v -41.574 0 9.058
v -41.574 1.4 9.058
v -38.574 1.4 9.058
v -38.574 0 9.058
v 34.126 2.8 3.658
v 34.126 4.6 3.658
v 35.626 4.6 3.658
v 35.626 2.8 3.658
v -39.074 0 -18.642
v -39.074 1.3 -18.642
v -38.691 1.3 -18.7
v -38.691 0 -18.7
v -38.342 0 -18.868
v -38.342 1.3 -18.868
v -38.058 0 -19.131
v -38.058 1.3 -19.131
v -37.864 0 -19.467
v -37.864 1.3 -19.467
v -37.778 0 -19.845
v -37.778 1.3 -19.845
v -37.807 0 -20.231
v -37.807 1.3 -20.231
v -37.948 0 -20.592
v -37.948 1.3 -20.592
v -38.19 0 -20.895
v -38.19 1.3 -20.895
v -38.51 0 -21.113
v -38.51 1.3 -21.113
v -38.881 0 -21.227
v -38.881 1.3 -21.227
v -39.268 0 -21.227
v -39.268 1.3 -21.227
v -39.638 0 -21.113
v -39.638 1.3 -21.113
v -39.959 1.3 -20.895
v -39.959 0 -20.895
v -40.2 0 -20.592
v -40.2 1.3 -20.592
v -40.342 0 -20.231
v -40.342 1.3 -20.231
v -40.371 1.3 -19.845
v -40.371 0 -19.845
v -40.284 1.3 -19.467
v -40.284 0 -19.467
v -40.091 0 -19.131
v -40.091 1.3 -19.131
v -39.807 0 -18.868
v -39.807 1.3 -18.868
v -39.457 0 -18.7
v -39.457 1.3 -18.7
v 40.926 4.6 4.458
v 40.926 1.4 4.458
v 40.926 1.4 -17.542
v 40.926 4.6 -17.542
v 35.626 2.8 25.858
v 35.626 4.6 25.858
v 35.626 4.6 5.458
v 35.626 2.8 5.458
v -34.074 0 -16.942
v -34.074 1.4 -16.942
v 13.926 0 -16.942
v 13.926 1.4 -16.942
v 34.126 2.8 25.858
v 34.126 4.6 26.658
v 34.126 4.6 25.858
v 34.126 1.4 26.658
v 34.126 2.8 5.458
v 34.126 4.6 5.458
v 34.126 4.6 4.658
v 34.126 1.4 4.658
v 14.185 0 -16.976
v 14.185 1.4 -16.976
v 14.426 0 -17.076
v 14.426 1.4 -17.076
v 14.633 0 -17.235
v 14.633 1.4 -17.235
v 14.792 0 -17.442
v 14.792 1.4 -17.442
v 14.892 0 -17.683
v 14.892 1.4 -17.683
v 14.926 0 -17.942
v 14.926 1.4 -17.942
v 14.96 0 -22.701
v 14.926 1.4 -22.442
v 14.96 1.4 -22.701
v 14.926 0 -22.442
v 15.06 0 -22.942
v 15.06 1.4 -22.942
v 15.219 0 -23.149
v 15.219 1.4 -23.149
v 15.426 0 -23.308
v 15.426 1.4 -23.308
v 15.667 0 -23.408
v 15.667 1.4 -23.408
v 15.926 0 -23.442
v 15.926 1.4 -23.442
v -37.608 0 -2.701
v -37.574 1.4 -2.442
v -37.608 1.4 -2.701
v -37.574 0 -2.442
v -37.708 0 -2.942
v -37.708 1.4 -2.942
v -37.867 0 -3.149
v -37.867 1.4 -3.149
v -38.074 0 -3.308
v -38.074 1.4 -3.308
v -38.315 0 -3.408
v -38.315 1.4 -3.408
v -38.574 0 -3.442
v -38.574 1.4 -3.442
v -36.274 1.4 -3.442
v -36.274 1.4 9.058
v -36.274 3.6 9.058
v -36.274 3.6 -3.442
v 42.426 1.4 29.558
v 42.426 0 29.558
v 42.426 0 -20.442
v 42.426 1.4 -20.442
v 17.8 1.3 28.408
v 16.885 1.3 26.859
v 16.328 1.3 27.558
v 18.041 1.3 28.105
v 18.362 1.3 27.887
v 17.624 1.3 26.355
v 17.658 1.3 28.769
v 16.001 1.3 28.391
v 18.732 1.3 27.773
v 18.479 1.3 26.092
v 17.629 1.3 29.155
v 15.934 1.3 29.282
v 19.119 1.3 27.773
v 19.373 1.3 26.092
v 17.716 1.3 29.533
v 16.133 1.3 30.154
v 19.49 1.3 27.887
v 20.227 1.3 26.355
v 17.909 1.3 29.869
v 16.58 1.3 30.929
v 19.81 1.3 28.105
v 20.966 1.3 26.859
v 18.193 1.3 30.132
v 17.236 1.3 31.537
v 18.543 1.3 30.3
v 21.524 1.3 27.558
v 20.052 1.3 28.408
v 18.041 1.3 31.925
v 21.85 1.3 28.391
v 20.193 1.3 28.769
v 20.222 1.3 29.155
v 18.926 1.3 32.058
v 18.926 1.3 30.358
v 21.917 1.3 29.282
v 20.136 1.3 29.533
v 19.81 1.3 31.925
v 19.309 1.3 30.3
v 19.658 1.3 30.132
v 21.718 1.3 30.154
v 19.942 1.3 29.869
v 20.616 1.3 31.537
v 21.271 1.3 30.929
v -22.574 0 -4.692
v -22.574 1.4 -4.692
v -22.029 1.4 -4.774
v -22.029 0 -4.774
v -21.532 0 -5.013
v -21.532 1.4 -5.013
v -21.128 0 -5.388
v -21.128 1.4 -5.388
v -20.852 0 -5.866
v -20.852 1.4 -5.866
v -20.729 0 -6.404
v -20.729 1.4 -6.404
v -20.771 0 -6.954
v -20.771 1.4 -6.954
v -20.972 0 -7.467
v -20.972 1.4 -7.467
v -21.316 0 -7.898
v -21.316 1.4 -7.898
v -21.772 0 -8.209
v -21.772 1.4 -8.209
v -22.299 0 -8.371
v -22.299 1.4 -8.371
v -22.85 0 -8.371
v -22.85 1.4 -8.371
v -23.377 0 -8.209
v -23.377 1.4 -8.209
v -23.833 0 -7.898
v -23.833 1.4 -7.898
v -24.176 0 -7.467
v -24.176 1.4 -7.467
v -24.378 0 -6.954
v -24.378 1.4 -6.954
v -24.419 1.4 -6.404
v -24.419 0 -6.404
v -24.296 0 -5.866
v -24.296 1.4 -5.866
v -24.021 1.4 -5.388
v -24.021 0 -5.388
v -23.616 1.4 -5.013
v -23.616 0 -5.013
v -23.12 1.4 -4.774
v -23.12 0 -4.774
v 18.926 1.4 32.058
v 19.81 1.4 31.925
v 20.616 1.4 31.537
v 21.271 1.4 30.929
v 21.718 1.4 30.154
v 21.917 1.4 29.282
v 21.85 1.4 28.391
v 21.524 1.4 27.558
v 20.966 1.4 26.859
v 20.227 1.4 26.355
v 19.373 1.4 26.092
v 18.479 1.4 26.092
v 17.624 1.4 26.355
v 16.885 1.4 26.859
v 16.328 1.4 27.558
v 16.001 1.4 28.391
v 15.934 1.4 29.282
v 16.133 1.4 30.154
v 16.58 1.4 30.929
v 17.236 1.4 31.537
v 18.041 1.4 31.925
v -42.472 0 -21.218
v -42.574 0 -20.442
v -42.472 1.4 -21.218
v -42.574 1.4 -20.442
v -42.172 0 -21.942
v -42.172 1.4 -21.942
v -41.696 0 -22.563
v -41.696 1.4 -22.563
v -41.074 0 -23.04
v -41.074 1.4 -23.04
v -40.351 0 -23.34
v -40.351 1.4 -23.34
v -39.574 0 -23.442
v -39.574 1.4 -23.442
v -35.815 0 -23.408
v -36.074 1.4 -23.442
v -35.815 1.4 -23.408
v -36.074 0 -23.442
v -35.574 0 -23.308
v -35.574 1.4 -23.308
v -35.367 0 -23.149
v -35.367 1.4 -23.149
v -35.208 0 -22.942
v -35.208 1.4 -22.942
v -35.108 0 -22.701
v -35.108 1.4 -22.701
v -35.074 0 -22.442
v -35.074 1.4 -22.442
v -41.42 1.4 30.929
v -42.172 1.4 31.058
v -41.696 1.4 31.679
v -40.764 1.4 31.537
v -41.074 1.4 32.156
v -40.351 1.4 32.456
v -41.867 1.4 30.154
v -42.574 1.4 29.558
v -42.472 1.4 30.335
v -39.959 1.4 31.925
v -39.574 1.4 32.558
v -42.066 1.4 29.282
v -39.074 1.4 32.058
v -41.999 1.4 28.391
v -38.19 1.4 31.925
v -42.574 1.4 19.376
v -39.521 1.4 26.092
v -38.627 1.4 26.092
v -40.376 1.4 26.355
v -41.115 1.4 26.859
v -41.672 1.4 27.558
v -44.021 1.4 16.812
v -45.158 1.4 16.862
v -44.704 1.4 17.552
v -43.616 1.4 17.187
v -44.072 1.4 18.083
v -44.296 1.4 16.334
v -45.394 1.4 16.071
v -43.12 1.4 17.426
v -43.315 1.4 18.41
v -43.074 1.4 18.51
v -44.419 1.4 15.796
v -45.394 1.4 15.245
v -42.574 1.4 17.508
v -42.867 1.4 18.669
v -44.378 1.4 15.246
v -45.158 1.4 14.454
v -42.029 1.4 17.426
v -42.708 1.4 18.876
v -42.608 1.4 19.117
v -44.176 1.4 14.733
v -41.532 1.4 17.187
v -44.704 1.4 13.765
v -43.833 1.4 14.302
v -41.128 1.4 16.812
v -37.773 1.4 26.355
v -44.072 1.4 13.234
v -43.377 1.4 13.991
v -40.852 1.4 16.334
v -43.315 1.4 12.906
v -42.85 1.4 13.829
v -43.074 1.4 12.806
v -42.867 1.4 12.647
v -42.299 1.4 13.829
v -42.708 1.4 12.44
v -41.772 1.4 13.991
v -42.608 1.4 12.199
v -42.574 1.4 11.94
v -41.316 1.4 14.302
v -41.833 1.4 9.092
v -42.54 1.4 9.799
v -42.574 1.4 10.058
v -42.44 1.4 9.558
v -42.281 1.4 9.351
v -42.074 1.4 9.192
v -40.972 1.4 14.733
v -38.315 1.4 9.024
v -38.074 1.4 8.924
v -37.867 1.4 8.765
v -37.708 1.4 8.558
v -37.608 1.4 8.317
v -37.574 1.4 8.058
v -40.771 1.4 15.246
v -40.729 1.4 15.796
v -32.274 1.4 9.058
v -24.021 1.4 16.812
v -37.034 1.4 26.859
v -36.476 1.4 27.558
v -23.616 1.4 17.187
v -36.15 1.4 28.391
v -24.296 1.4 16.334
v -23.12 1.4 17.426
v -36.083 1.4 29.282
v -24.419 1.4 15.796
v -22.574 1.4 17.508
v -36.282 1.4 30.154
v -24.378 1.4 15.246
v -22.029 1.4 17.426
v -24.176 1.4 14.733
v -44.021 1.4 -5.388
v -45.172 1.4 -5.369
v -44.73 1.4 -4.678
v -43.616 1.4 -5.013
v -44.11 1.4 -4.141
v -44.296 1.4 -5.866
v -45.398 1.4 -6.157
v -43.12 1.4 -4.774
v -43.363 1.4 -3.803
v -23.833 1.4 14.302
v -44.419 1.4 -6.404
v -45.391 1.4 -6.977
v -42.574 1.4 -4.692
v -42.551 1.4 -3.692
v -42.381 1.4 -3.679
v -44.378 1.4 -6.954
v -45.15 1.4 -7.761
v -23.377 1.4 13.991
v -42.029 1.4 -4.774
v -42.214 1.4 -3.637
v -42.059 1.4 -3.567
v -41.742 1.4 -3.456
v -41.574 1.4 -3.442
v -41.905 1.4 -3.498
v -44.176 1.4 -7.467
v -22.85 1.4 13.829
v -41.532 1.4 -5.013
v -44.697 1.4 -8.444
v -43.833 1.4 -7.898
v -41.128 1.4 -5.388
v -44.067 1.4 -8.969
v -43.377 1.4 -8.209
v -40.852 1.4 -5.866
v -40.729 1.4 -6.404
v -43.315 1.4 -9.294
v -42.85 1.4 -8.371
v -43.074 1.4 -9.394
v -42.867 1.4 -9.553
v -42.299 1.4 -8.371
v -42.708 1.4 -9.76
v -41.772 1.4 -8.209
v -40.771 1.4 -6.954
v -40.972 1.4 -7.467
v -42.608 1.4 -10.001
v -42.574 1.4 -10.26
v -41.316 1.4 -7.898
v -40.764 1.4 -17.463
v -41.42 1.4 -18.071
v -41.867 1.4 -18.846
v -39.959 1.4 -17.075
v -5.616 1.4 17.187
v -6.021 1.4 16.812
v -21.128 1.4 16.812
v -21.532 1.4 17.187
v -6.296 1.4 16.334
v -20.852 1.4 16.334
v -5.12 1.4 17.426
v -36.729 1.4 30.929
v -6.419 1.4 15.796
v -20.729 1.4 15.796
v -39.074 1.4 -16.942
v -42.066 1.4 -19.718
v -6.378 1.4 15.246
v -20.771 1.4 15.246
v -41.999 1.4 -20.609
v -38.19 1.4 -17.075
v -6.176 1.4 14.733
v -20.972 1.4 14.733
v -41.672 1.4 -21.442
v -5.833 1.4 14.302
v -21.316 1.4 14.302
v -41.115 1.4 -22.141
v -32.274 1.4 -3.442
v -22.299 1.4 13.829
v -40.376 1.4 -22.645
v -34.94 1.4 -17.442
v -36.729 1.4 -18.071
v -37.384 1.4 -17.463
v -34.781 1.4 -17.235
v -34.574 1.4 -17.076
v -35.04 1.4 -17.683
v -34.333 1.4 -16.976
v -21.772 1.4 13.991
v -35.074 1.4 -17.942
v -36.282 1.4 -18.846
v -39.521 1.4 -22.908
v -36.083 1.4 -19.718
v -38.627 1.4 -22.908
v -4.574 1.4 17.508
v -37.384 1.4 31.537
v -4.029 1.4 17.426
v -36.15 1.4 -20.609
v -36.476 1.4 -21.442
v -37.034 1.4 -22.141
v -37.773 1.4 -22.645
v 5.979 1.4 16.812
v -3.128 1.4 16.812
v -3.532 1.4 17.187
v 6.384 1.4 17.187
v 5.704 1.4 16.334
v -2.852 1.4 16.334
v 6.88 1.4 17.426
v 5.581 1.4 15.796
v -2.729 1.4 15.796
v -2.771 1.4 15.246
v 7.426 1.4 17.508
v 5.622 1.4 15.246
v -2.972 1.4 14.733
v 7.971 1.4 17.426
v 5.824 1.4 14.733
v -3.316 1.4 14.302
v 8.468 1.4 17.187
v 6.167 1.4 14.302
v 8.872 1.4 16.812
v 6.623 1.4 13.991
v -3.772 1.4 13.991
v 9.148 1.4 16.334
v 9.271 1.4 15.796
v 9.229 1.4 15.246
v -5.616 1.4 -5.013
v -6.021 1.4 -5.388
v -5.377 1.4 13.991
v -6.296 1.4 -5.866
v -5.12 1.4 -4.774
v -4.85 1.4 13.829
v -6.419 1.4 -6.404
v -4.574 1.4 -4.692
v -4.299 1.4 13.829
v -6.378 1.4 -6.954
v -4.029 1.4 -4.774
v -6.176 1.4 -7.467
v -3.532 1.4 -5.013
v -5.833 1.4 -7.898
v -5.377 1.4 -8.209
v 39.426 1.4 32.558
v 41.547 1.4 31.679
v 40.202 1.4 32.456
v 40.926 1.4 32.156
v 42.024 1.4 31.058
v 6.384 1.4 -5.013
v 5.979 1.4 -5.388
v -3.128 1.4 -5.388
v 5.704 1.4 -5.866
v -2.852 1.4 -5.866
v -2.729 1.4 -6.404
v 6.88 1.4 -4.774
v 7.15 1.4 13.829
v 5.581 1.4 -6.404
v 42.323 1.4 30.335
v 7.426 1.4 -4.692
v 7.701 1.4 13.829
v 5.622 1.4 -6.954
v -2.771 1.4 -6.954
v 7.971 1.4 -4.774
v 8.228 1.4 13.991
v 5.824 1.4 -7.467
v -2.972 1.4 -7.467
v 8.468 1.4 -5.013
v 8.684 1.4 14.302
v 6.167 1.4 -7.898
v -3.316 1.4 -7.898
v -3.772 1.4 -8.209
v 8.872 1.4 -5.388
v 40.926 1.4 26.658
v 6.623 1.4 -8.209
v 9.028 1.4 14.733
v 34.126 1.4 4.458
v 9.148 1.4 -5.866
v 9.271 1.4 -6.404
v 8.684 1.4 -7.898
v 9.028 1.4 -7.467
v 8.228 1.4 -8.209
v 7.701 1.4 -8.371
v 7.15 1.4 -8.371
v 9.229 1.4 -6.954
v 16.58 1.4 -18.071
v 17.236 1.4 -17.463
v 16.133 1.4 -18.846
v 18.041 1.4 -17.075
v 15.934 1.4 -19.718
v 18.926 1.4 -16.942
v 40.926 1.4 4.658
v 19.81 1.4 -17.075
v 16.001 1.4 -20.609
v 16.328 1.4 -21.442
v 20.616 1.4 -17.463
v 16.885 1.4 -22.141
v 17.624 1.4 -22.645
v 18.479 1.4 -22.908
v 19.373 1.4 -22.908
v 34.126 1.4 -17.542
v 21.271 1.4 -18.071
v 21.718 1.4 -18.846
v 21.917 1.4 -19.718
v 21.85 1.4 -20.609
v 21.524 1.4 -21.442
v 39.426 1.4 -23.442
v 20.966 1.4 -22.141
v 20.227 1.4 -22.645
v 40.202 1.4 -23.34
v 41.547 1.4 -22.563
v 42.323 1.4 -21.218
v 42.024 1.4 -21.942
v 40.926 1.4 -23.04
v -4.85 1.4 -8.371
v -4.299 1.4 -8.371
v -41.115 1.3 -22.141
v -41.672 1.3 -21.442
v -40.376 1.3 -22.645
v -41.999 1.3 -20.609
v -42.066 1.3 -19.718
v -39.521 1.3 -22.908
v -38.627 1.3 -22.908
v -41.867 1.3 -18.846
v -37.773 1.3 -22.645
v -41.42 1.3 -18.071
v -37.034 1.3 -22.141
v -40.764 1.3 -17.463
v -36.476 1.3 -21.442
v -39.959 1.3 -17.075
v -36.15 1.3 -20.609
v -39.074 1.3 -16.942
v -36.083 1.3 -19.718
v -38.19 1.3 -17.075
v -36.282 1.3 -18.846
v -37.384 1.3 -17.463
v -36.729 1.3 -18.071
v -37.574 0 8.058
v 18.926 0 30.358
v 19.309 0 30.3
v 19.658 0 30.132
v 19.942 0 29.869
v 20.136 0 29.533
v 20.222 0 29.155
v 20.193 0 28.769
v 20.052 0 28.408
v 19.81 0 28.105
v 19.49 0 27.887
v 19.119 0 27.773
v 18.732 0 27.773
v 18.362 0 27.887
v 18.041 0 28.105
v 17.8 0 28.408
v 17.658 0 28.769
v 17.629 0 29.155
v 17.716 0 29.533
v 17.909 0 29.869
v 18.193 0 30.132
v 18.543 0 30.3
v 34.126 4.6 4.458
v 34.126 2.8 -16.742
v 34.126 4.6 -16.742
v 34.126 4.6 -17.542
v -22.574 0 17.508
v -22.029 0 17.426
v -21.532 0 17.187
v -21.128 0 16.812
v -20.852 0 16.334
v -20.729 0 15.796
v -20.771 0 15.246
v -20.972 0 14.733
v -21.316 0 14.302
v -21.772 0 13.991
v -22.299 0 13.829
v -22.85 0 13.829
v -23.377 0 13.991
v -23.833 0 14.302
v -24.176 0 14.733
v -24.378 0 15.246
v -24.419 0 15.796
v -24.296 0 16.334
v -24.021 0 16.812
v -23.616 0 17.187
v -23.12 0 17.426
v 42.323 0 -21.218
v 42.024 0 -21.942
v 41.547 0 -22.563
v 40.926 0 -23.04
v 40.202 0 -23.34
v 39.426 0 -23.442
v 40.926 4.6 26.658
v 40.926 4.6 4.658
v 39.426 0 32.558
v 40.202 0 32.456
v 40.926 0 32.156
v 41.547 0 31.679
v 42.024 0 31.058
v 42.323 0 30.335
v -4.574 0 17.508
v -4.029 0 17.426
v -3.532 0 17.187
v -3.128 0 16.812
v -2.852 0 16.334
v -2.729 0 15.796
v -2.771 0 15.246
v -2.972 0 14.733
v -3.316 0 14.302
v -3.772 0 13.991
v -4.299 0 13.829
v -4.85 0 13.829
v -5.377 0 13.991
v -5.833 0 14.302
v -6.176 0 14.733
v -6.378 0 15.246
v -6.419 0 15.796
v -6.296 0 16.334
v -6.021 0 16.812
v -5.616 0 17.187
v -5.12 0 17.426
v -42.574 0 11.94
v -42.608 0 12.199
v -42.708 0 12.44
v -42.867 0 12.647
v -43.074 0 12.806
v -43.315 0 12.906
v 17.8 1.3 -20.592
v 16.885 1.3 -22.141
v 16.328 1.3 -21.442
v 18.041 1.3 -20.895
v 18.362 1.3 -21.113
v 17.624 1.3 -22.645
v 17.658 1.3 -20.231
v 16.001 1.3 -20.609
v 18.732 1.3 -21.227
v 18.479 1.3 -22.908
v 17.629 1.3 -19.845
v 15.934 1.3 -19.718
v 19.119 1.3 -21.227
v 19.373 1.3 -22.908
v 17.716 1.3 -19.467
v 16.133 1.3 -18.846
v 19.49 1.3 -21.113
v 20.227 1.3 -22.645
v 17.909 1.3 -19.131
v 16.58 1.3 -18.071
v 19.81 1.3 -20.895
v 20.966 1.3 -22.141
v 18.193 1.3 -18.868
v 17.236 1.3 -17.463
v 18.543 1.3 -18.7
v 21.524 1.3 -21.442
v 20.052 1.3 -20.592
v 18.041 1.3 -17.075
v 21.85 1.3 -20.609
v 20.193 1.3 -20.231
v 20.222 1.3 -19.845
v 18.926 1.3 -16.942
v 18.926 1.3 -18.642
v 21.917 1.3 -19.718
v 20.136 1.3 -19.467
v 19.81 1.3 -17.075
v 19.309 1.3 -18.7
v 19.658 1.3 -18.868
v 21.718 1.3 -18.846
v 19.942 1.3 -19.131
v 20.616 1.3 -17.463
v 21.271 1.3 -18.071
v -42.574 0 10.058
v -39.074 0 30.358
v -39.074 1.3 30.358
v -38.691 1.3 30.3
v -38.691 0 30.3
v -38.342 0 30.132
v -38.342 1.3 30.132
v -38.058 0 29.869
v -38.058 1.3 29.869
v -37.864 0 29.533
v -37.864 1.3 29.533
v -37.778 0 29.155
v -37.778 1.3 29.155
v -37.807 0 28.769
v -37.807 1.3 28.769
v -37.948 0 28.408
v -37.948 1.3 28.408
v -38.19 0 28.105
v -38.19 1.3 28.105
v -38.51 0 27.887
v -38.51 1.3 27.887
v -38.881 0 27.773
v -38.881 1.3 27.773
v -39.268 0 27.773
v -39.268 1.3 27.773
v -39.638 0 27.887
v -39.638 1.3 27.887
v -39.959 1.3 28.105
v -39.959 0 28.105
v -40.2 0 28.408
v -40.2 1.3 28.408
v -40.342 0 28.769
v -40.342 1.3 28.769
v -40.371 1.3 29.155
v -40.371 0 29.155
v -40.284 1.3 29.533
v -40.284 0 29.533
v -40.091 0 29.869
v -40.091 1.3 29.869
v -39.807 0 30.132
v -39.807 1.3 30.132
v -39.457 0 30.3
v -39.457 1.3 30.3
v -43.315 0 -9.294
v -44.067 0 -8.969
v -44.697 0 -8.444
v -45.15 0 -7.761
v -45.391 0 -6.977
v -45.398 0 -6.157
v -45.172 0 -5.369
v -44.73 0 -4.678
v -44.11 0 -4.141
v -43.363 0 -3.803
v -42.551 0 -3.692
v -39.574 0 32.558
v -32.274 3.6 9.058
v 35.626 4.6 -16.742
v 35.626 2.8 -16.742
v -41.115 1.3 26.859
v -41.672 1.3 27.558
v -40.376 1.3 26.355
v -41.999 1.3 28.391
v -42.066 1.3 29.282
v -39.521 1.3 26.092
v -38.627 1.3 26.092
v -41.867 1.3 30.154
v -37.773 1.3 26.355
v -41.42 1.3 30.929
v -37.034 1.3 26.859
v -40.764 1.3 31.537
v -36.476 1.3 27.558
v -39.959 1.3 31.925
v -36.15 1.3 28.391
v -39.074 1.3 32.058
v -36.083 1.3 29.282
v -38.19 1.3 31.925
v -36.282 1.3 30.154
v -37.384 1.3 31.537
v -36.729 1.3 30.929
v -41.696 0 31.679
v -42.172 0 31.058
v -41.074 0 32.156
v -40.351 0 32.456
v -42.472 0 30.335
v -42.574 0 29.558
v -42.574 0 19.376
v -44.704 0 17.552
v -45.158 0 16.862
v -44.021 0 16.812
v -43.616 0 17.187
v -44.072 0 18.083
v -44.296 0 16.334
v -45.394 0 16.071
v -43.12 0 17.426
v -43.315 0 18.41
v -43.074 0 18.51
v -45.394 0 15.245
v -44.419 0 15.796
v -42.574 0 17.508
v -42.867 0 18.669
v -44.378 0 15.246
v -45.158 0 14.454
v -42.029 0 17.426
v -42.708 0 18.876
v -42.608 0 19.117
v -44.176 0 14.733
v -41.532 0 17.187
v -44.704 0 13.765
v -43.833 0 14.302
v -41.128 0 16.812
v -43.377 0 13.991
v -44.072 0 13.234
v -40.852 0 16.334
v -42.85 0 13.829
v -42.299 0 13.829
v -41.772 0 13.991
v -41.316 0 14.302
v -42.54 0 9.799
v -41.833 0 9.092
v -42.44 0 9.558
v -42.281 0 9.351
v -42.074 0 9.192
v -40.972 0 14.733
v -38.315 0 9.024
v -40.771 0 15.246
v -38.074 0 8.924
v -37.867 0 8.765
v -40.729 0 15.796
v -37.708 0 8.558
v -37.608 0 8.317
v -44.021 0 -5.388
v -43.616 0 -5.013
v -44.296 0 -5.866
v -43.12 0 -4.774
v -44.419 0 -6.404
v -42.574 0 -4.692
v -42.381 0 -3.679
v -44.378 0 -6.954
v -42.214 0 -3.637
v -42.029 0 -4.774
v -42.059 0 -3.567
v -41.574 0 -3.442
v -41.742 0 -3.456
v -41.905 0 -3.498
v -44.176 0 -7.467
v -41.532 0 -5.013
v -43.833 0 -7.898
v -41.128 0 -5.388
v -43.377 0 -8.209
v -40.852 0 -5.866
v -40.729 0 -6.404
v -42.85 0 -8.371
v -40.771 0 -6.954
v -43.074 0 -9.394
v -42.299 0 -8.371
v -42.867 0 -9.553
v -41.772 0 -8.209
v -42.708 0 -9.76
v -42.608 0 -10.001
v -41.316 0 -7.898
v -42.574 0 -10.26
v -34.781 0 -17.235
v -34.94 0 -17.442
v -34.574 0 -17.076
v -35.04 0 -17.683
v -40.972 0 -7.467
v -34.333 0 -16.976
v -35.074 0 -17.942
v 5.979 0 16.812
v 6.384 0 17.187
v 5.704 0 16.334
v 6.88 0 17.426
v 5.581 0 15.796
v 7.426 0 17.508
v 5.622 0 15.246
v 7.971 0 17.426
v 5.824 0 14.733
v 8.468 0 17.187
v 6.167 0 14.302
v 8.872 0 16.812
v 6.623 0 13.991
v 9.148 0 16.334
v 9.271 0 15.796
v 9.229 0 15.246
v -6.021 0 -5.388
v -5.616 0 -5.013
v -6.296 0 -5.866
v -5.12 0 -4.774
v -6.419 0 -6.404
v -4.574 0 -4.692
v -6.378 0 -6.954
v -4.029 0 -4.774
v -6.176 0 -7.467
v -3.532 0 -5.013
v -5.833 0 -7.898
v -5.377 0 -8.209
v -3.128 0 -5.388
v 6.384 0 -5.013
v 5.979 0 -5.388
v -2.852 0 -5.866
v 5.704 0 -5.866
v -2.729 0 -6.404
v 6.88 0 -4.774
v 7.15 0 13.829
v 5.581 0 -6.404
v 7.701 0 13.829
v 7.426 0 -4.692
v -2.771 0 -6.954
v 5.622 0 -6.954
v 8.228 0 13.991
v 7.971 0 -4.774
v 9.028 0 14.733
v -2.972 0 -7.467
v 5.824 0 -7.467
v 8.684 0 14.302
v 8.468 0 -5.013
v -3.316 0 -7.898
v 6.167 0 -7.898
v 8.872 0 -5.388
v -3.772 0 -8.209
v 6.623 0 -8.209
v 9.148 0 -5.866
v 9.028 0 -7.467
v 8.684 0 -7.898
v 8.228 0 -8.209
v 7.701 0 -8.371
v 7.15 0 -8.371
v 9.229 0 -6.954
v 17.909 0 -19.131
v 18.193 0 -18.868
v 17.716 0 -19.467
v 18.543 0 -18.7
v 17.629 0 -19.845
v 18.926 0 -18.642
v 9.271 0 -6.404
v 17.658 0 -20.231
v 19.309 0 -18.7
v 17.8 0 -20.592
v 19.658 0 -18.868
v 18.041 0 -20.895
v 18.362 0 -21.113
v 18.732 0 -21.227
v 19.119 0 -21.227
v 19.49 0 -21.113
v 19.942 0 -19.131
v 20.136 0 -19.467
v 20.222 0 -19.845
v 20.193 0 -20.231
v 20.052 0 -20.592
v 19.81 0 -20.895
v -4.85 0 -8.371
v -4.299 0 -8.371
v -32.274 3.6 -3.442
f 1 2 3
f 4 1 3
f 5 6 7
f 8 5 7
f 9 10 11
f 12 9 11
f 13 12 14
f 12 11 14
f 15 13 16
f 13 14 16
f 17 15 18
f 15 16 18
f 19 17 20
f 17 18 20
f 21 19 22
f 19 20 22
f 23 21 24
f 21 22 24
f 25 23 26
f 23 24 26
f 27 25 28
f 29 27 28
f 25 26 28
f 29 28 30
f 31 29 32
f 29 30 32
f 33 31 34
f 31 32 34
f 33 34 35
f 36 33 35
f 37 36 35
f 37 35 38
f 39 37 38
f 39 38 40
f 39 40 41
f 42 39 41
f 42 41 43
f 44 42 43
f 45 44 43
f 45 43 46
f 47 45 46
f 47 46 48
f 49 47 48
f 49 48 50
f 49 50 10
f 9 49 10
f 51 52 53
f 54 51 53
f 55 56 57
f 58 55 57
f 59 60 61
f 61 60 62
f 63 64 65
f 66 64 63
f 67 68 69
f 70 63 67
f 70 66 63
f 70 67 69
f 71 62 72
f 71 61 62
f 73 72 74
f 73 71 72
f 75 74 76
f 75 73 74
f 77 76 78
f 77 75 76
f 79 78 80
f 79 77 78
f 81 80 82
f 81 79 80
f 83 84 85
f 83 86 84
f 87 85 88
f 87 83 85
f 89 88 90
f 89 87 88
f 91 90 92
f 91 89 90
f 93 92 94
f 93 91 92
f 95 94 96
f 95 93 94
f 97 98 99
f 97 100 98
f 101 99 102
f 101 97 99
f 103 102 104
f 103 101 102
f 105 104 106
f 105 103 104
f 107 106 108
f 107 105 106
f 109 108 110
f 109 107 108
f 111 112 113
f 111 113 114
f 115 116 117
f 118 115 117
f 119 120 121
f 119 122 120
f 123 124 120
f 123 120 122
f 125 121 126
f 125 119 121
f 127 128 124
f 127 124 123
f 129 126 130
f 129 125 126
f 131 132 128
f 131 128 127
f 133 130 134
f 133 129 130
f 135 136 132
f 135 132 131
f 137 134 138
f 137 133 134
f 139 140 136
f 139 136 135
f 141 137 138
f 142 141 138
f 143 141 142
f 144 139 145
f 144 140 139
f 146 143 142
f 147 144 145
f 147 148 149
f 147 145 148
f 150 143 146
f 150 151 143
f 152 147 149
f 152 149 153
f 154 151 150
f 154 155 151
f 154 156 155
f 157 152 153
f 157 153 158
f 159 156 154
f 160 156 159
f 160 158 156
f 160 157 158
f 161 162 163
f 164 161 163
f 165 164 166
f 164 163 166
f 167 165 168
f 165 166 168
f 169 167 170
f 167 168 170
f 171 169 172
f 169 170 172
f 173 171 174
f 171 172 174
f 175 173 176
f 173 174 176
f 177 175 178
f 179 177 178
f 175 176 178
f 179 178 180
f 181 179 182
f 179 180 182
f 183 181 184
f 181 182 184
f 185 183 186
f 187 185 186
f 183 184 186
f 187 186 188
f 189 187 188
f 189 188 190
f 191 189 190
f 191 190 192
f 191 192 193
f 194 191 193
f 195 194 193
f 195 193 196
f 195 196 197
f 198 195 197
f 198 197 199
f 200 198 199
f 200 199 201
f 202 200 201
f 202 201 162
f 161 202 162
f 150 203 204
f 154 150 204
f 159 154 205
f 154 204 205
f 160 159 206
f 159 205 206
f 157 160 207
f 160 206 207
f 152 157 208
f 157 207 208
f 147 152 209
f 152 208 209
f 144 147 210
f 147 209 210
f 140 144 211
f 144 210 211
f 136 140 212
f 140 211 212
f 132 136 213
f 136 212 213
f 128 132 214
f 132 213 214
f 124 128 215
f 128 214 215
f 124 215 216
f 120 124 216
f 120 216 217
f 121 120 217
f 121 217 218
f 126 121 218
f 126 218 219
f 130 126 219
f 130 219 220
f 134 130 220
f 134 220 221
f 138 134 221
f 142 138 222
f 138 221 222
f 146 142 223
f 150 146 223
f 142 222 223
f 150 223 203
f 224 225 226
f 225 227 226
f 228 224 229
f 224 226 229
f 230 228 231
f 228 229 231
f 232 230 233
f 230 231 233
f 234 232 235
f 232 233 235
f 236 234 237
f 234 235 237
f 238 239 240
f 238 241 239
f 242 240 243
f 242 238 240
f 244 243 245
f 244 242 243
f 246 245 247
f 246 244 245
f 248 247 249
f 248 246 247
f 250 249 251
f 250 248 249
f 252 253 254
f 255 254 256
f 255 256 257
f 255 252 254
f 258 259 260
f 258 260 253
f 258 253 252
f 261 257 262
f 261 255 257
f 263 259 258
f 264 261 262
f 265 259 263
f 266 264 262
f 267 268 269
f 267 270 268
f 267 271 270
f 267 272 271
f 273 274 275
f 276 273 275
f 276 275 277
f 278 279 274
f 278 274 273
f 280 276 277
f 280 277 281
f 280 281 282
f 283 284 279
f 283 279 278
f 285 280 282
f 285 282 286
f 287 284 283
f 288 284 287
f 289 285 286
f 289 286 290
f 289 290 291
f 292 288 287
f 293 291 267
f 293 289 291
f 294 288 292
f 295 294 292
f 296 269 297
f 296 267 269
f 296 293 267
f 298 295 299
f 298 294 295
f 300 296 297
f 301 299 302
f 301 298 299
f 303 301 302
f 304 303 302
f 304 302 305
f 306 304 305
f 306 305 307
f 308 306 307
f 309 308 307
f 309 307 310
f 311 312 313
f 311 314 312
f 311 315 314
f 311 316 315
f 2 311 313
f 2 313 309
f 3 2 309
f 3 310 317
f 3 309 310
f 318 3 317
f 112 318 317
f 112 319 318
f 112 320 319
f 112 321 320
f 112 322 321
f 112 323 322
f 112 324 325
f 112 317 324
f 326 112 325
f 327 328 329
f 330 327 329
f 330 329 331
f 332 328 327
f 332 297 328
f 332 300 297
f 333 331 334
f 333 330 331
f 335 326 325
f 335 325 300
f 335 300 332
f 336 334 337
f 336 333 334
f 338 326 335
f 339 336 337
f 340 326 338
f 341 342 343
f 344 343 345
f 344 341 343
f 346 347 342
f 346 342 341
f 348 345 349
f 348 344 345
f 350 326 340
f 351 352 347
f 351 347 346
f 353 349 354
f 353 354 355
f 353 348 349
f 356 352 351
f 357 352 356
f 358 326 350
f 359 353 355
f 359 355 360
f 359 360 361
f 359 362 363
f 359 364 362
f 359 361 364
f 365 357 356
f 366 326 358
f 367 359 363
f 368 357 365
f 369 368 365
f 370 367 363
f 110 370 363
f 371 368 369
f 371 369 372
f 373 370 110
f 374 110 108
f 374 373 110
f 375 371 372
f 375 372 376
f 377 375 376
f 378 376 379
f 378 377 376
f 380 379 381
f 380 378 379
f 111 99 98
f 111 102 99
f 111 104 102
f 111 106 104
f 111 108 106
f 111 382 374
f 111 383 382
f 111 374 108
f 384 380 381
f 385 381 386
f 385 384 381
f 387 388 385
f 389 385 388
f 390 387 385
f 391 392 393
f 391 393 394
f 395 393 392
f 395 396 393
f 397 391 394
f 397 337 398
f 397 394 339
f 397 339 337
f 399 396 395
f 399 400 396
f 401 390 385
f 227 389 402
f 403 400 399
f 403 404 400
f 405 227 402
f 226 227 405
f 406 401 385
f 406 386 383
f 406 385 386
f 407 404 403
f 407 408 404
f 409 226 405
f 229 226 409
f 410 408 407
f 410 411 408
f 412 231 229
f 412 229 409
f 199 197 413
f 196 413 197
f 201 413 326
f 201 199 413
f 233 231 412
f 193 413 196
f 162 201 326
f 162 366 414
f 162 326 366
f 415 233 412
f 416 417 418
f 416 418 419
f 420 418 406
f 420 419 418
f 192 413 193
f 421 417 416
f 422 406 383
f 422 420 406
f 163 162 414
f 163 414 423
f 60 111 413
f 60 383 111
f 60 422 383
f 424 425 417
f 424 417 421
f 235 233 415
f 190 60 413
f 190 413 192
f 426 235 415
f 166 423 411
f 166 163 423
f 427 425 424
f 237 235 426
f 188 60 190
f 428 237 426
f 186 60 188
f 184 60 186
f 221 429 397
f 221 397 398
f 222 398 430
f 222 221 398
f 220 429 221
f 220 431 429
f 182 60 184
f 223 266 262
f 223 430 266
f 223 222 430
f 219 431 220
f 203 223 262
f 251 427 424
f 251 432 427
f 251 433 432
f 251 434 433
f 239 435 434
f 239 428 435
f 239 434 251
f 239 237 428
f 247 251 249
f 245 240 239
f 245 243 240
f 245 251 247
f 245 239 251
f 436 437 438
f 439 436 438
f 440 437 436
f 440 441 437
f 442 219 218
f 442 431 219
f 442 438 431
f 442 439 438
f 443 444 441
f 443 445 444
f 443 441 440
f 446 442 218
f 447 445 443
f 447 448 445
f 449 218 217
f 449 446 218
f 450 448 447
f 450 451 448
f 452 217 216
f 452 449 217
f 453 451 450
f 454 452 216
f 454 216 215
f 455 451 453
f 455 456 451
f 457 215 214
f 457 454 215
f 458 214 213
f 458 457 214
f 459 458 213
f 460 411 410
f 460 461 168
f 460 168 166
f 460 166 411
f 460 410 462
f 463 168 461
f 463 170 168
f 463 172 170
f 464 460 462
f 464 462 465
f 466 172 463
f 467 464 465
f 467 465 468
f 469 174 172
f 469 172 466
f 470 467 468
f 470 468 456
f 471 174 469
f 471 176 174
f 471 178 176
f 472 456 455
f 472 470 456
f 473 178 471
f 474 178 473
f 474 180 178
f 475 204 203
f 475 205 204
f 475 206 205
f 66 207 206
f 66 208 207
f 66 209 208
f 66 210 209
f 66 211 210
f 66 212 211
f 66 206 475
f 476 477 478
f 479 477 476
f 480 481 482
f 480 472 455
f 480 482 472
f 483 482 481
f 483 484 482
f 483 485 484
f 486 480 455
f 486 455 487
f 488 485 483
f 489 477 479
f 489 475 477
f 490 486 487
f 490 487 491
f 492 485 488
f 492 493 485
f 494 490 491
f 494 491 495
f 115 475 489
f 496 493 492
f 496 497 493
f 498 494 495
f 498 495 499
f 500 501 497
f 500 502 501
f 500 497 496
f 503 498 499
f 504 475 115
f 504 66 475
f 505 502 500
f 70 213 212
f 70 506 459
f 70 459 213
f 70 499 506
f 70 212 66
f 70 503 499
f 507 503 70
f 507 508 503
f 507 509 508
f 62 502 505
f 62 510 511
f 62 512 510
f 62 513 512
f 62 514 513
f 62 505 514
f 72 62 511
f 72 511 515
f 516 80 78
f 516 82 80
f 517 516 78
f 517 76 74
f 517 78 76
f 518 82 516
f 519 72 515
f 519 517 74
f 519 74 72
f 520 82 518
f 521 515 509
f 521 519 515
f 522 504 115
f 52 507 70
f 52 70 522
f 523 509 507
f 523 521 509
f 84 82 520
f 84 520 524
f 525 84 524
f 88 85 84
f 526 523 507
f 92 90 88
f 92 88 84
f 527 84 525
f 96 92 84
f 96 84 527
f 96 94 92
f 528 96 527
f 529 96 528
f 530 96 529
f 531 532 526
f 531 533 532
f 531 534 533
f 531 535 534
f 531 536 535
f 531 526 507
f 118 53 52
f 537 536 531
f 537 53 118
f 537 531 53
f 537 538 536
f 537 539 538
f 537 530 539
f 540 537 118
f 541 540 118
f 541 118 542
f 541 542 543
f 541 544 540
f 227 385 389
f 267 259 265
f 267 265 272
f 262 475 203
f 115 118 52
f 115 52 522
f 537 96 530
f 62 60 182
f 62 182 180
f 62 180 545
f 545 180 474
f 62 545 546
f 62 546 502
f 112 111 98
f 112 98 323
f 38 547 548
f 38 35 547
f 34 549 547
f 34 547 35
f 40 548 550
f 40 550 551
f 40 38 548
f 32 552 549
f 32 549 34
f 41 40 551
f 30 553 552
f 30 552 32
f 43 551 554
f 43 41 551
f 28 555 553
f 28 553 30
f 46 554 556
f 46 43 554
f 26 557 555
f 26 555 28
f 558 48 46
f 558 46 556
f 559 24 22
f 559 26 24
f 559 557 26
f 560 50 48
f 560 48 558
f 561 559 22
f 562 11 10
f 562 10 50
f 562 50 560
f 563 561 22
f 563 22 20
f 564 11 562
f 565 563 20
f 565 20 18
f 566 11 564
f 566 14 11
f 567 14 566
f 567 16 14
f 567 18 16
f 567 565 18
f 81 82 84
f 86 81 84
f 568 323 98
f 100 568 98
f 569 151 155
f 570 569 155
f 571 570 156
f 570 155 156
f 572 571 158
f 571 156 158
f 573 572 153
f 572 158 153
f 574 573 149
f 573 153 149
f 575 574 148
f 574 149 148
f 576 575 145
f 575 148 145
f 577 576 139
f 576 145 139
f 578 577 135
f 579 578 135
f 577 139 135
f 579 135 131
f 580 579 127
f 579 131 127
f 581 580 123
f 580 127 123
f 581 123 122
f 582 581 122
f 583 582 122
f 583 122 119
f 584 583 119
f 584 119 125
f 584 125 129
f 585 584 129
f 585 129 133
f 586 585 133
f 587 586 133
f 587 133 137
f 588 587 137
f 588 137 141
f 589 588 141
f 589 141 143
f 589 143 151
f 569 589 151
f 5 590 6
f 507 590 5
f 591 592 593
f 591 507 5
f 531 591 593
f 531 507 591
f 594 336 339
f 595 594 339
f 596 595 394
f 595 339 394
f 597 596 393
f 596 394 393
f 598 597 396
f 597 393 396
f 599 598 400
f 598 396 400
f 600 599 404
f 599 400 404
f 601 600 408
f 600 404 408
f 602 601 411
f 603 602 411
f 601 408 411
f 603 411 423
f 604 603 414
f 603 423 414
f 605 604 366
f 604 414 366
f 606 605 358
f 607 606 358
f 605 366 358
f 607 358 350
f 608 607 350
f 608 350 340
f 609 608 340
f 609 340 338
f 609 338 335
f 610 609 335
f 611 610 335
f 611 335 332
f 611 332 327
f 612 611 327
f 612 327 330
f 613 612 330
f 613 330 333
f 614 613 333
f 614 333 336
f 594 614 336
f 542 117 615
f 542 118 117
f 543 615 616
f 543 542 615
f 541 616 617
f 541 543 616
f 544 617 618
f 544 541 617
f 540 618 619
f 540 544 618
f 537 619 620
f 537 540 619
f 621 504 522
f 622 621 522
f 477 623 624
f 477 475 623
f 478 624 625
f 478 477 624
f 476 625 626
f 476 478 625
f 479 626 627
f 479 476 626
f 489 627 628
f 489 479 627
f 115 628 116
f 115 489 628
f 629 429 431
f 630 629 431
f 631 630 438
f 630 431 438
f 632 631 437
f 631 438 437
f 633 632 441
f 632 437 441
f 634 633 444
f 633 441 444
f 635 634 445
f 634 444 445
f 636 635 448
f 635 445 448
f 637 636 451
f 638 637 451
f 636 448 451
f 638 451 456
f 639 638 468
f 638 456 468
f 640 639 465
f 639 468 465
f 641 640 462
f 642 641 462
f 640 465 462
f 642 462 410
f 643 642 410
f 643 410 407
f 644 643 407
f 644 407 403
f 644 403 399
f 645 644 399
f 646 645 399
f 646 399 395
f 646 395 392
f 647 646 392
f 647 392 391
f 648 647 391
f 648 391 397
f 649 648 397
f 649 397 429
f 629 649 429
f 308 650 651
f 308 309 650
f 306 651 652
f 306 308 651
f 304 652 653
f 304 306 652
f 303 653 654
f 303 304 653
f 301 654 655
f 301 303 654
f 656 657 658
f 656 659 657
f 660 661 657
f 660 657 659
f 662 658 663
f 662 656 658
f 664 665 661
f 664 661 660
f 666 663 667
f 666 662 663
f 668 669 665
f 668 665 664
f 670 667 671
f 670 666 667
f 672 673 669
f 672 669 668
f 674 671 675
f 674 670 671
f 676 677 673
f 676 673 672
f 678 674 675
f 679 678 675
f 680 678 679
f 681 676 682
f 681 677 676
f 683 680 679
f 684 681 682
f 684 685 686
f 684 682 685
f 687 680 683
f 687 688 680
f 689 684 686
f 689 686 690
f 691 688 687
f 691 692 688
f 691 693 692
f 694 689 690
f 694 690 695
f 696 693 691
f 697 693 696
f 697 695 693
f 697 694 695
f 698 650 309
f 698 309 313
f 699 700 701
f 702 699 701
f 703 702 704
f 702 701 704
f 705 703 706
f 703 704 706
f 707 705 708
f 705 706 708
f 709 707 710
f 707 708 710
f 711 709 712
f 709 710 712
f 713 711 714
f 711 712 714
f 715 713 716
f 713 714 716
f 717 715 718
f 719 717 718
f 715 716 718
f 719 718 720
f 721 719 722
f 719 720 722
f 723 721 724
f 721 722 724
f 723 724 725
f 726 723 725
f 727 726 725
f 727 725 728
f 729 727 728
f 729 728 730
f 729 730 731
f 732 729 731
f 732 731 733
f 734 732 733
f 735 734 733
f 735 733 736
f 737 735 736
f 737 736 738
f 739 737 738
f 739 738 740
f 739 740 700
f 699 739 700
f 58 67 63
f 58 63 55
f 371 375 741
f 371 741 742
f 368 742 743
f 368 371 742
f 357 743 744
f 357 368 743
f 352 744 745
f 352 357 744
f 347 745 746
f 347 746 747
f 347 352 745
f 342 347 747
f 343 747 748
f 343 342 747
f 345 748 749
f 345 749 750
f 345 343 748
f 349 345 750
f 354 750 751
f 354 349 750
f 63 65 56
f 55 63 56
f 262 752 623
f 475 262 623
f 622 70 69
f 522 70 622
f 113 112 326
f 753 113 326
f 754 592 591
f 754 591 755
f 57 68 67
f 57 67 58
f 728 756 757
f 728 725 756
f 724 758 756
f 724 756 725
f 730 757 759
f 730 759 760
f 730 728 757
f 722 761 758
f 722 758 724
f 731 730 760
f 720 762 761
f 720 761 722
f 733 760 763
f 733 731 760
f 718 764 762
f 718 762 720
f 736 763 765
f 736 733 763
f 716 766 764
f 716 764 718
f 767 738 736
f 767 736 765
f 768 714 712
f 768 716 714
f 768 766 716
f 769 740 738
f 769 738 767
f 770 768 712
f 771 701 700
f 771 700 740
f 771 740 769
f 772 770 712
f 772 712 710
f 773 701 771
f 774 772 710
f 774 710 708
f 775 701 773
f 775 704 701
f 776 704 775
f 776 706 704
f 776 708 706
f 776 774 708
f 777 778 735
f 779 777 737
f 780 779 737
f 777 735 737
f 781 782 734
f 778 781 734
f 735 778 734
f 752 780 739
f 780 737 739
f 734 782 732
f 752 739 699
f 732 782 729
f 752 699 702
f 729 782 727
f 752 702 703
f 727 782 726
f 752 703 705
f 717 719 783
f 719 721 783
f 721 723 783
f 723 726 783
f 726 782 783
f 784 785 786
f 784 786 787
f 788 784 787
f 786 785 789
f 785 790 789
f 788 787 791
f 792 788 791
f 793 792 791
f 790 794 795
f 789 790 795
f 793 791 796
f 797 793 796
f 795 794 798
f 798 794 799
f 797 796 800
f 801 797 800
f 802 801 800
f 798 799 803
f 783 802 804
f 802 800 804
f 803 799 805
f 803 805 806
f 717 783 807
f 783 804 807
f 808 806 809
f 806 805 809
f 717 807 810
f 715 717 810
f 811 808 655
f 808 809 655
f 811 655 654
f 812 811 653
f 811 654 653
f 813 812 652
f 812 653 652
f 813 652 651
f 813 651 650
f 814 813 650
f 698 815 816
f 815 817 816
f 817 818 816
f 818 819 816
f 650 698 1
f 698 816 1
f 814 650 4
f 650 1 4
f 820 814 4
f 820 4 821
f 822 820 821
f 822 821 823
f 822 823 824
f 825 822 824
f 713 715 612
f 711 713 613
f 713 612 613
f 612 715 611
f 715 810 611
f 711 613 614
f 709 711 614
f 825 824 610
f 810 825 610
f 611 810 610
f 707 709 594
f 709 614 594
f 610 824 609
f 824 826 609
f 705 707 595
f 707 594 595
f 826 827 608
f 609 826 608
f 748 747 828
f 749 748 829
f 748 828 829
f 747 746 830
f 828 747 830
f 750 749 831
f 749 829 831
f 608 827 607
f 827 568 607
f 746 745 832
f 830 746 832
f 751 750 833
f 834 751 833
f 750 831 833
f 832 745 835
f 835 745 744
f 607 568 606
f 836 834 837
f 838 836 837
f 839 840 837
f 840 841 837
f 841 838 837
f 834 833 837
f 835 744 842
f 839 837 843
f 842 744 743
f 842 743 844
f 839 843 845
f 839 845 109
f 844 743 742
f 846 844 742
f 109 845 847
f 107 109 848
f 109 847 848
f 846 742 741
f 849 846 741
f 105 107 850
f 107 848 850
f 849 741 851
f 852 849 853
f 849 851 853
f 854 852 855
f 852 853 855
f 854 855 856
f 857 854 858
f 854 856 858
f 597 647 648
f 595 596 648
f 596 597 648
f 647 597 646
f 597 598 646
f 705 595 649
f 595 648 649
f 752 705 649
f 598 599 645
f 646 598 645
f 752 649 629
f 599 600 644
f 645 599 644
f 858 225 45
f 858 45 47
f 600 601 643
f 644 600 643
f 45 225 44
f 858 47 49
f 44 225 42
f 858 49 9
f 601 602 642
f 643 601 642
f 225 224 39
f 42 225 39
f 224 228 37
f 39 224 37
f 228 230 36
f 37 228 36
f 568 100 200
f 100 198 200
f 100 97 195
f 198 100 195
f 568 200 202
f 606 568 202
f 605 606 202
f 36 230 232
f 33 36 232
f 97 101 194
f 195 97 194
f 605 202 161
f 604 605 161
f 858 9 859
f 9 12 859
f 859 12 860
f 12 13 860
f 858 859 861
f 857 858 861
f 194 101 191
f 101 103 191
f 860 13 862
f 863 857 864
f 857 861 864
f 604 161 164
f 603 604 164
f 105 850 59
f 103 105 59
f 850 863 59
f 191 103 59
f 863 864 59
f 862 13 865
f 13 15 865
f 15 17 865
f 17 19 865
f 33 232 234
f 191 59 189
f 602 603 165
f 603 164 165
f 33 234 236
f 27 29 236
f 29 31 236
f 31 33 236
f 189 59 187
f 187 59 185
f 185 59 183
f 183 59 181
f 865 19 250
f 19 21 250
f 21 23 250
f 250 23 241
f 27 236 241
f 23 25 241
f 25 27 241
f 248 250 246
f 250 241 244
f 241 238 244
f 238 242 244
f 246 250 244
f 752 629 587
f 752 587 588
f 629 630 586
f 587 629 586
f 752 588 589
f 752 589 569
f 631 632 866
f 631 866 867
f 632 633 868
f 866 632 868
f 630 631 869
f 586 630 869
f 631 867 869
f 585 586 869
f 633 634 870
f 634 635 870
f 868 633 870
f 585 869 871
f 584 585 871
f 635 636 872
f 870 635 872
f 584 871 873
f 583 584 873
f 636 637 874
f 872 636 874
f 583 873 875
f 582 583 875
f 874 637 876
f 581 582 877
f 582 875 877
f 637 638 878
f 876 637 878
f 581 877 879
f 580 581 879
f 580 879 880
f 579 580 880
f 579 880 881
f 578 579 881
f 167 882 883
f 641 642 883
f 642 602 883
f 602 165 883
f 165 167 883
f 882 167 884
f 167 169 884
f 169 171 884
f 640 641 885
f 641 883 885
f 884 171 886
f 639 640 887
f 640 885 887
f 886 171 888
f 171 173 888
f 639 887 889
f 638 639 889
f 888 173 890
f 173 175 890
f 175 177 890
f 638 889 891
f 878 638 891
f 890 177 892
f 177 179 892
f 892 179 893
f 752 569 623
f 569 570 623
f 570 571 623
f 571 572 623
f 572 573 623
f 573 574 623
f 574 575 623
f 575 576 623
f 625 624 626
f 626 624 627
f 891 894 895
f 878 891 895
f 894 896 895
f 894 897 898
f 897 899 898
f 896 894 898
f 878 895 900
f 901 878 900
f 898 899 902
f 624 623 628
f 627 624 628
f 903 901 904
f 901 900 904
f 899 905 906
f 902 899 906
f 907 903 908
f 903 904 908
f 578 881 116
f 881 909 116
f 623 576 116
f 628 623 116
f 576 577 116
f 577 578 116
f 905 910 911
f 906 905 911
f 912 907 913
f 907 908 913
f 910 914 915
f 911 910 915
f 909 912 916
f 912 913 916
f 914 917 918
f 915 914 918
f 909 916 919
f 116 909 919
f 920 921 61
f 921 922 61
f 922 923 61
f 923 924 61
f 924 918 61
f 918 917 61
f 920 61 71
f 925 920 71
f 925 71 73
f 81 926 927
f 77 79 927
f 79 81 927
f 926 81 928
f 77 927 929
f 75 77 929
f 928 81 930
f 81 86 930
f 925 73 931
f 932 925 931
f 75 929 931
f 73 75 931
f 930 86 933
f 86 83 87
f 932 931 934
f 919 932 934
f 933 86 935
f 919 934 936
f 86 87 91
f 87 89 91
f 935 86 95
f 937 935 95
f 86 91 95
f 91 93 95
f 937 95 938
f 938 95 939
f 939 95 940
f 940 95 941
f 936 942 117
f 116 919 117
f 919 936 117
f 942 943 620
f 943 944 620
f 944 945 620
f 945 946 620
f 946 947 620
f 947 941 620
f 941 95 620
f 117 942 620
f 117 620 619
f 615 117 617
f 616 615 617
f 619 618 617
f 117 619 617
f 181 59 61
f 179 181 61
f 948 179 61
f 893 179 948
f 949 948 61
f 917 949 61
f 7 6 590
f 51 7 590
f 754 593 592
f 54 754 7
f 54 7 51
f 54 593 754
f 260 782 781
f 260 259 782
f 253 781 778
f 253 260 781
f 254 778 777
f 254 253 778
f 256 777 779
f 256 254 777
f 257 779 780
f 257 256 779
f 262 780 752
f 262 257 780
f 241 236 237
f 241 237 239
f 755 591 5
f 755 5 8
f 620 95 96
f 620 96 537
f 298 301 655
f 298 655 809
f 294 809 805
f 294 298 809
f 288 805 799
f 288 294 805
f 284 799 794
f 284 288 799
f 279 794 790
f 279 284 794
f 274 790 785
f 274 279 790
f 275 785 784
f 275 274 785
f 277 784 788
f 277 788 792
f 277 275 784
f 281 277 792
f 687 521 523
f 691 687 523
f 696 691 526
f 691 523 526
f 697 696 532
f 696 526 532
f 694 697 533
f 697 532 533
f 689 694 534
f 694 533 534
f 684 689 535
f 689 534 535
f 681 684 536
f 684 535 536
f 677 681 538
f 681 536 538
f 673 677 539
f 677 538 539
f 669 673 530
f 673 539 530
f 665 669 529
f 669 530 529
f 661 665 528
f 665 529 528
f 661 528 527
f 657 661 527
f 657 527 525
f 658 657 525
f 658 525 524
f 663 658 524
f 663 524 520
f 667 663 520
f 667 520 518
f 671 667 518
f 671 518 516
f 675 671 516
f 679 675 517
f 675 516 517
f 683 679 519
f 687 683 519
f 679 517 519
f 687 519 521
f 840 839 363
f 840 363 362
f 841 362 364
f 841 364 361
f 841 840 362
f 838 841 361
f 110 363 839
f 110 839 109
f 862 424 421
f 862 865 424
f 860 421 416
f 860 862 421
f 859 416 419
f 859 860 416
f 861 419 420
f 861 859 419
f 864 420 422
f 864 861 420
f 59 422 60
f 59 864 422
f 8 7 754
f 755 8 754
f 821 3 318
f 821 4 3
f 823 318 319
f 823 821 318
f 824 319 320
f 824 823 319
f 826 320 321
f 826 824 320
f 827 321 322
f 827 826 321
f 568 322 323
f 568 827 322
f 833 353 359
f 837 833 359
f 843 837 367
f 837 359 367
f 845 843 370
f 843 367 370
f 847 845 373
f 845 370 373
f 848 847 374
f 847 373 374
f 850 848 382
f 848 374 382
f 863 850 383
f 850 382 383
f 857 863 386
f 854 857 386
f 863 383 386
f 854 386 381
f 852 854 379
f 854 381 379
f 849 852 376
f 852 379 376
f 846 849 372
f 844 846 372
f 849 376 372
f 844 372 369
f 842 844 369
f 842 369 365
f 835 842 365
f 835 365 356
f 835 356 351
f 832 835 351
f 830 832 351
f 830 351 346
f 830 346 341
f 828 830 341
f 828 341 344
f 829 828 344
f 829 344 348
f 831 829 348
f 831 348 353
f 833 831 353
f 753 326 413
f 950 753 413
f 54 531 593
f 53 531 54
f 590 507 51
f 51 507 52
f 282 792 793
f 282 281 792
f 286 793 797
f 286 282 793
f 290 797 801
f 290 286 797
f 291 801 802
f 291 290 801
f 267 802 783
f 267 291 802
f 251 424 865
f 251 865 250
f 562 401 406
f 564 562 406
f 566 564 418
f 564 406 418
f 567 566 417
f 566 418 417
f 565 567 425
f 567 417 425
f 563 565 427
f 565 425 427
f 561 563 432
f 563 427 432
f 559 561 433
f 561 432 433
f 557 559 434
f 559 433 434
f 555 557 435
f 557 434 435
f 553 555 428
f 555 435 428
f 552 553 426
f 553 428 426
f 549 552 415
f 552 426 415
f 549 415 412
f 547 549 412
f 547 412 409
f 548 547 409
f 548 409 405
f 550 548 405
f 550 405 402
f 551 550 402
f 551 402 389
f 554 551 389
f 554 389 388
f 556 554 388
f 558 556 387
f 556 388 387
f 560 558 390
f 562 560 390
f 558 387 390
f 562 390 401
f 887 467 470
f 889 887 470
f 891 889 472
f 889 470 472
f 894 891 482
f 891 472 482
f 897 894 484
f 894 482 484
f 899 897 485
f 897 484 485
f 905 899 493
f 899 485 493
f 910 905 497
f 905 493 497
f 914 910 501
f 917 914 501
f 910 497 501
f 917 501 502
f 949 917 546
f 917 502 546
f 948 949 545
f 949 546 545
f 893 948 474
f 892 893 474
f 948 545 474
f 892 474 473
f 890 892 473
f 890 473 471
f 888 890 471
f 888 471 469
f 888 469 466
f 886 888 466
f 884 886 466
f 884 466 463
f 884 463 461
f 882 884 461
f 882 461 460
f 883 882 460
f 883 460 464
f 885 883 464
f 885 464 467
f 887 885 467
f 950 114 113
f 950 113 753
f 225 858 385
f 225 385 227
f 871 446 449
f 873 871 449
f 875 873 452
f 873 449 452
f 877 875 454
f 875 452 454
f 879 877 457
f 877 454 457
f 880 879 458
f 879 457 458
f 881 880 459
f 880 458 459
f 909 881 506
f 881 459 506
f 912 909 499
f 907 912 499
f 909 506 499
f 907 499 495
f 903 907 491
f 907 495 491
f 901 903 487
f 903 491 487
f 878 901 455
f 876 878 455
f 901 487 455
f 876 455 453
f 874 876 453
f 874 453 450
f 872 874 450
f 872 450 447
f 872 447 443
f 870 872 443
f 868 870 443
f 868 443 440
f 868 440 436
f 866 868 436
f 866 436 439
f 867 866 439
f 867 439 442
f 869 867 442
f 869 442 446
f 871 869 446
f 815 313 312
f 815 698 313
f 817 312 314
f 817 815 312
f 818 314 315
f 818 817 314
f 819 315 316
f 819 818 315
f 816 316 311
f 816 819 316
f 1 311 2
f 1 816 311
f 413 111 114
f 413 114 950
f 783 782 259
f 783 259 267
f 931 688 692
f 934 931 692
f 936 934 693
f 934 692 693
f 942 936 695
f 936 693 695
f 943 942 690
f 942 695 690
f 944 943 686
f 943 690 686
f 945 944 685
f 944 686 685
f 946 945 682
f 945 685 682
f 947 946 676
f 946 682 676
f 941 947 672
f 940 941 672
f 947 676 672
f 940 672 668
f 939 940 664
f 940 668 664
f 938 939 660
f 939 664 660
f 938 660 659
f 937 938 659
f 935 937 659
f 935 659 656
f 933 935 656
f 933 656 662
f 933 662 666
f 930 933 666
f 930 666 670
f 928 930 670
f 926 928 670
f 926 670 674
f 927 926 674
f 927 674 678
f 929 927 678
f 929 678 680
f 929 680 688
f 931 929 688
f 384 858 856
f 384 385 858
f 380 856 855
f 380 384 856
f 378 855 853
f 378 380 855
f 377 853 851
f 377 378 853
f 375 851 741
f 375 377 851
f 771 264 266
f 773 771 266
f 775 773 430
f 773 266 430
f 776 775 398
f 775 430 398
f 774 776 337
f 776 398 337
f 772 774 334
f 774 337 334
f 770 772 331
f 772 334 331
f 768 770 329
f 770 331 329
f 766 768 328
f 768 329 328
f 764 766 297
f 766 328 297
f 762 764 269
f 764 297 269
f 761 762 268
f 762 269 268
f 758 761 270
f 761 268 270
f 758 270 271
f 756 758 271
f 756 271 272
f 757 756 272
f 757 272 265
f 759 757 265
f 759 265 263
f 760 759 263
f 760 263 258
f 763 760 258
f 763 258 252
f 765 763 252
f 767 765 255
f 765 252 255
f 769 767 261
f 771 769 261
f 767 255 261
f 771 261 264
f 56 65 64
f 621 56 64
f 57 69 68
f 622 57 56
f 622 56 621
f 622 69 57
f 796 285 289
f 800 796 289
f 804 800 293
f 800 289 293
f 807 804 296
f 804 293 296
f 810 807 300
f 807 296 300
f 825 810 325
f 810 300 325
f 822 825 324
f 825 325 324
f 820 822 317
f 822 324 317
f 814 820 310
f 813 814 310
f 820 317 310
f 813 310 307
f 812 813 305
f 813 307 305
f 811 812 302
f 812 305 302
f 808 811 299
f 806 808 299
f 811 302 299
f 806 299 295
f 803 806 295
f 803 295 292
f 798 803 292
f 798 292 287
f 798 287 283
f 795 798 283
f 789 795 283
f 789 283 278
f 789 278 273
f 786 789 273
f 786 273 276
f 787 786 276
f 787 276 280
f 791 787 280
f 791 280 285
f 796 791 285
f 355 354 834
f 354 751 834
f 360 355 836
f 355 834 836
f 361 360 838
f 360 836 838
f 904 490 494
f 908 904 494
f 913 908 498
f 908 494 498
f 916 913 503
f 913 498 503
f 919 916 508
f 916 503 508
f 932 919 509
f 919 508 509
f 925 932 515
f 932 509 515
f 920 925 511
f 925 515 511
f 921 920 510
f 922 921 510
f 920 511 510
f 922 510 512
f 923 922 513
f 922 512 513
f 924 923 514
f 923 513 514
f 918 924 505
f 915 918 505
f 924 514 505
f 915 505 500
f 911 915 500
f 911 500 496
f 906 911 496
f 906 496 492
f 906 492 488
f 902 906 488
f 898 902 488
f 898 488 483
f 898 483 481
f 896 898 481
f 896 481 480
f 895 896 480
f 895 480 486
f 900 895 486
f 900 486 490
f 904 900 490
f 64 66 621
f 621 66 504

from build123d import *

# Parameters (mm, degrees)
SKETCH_1_W          = 85
SKETCH_1_H          = 56
EXTRUDE_1_DEPTH     = 1.4
FILLET_1_R          = 3
SKETCH_2_R          = 1.3
CUT_EXTRUDE_1_DEPTH = 1.5
SKETCH_7_R          = 3
CUT_EXTRUDE_4_DEPTH = 0.1
SKETCH_3_W          = 5
SKETCH_3_H          = 12.5
CUT_EXTRUDE_2_DEPTH = 1.5
FILLET_2_R          = 1
SKETCH_8_W          = 50
SKETCH_8_H          = 6.5
CUT_EXTRUDE_5_DEPTH = 54.614950043
FILLET_3_R          = 1
SKETCH_4_W          = 6.8
SKETCH_4_H          = 22
EXTRUDE_2_DEPTH     = 3.2
SKETCH_5_W          = 1.5
SKETCH_5_H          = 20.4
CUT_EXTRUDE_3_DEPTH = 1.8
SKETCH_6_W          = 4
SKETCH_6_H          = 12.5
EXTRUDE_3_DEPTH     = 2.2
SKETCH_10_R         = 2.85
EXTRUDE_4_DEPTH     = 1.4
SKETCH_9_R          = 1.85
CUT_EXTRUDE_6_DEPTH = 56.978914621
FILLET_4_R          = 1


with BuildPart() as part:
    # 草图1 → 凸台-拉伸1 (new body)
    with BuildSketch(Plane(origin=(0, 0, 0), x_dir=(1, 0, 0), z_dir=(0, 1, 0))):
        with Locations((-0.074300699, -4.558129371)):
            Rectangle(SKETCH_1_W, SKETCH_1_H)
    extrude(amount=EXTRUDE_1_DEPTH)

    # 圆角1
    fillet_1_edges = [part.edges().sort_by_distance(p)[0] for p in [
        (-42.574300699, 0.7, -23.441870629),
        (42.425699301, 0.7, -23.441870629),
        (42.425699301, 0.7, 32.558129371),
        (-42.574300699, 0.7, 32.558129371),
    ]]
    fillet(fillet_1_edges, radius=FILLET_1_R)

    # 草图2 → 切除-拉伸1 (cut)
    with BuildSketch(Plane(origin=(0, 1.4, 0), x_dir=(1, 0, 0), z_dir=(0, 1, 0))):
        with Locations(Location((-39.074300699, 19.941870629, 0), (0, 0, 270))):
            Circle(SKETCH_2_R)
        with Locations(Location((-39.074300699, -29.058129371, 0), (0, 0, 270))):
            Circle(SKETCH_2_R)
        with Locations(Location((18.925699301, -29.058129371, 0), (0, 0, 270))):
            Circle(SKETCH_2_R)
        with Locations(Location((18.925699301, 19.941870629, 0), (0, 0, 270))):
            Circle(SKETCH_2_R)
    extrude(amount=-CUT_EXTRUDE_1_DEPTH, mode=Mode.SUBTRACT)

    # 草图7 → 切除-拉伸4 (cut)
    with BuildSketch(Plane(origin=(0, 1.4, 0), x_dir=(1, 0, 0), z_dir=(0, 1, 0))):
        with Locations(Location((-39.074300699, 19.941870629, 0), (0, 0, 270))):
            Circle(SKETCH_7_R)
        with Locations(Location((18.925699301, 19.941870629, 0), (0, 0, 270))):
            Circle(SKETCH_7_R)
        with Locations(Location((-39.074300699, -29.058129371, 0), (0, 0, 270))):
            Circle(SKETCH_7_R)
        with Locations(Location((18.925699301, -29.058129371, 0), (0, 0, 270))):
            Circle(SKETCH_7_R)
    extrude(amount=-CUT_EXTRUDE_4_DEPTH, mode=Mode.SUBTRACT)

    # 草图3 → 切除-拉伸2 (cut)
    with BuildSketch(Plane(origin=(0, 1.4, 0), x_dir=(1, 0, 0), z_dir=(0, 1, 0))):
        with Locations((-40.074300699, -2.808129371)):
            Rectangle(SKETCH_3_W, SKETCH_3_H)
    extrude(amount=-CUT_EXTRUDE_2_DEPTH, mode=Mode.SUBTRACT)

    # 圆角2
    fillet_2_edges = [part.edges().sort_by_distance(p)[0] for p in [
        (-42.574300699, 0.7, 9.058129371),
        (-42.574300699, 0.7, -3.441870629),
        (-37.574300699, 0.7, -3.441870629),
        (-37.574300699, 0.7, 9.058129371),
    ]]
    fillet(fillet_2_edges, radius=FILLET_2_R)

    # 草图8 → 切除-拉伸5 (cut, through all)
    with BuildSketch(Plane(origin=(0, 1.4, 0), x_dir=(1, 0, 0), z_dir=(0, 1, 0))):
        with Locations((-10.074300699, 20.191870629)):
            Rectangle(SKETCH_8_W, SKETCH_8_H)
    extrude(amount=-CUT_EXTRUDE_5_DEPTH, mode=Mode.SUBTRACT)

    # 圆角3
    fillet_3_edges = [part.edges().sort_by_distance(p)[0] for p in [
        (-35.074300699, 0.7, -16.941870629),
        (-35.074300699, 0.7, -23.441870629),
        (14.925699301, 0.7, -23.441870629),
        (14.925699301, 0.7, -16.941870629),
    ]]
    fillet(fillet_3_edges, radius=FILLET_3_R)

    # 草图4 → 凸台-拉伸2 (add)
    with BuildSketch(Plane(origin=(0, 1.4, 0), x_dir=(1, 0, 0), z_dir=(0, 1, 0))):
        with Locations((37.525699301, 6.541870629)):
            Rectangle(SKETCH_4_W, SKETCH_4_H)
        with Locations((37.525699301, -15.658129371)):
            Rectangle(SKETCH_4_W, SKETCH_4_H)
    extrude(amount=EXTRUDE_2_DEPTH)

    # 草图5 → 切除-拉伸3 (cut)
    with BuildSketch(Plane(origin=(0, 4.6, 0), x_dir=(1, 0, 0), z_dir=(0, 1, 0))):
        with Locations((34.875699301, 6.541870629)):
            Rectangle(SKETCH_5_W, SKETCH_5_H)
        with Locations((34.875699301, -15.658129371)):
            Rectangle(SKETCH_5_W, SKETCH_5_H)
    extrude(amount=-CUT_EXTRUDE_3_DEPTH, mode=Mode.SUBTRACT)

    # 草图6 → 凸台-拉伸3 (add)
    with BuildSketch(Plane(origin=(0, 1.4, 0), x_dir=(1, 0, 0), z_dir=(0, 1, 0))):
        with Locations((-34.274300699, -2.808129371)):
            Rectangle(SKETCH_6_W, SKETCH_6_H)
    extrude(amount=EXTRUDE_3_DEPTH)

    # 草图10 → 凸台-拉伸4 (add)
    with BuildSketch(Plane(origin=(0, 1.4, 0), x_dir=(1, 0, 0), z_dir=(0, 1, 0))):
        with Locations((-42.574300699, 6.541870629)):
            Circle(SKETCH_10_R)
        with Locations((-42.574300699, -15.658129371)):
            Circle(SKETCH_10_R)
    extrude(amount=-EXTRUDE_4_DEPTH)

    # 草图9 → 切除-拉伸6 (cut, through all)
    with BuildSketch(Plane(origin=(0, 1.4, 0), x_dir=(1, 0, 0), z_dir=(0, 1, 0))):
        with Locations(Location((7.425699301, 6.541870629, 0), (0, 0, 270))):
            Circle(SKETCH_9_R)
        with Locations(Location((-4.574300699, 6.541870629, 0), (0, 0, 270))):
            Circle(SKETCH_9_R)
        with Locations(Location((-22.574300699, 6.541870629, 0), (0, 0, 270))):
            Circle(SKETCH_9_R)
        with Locations(Location((-22.574300699, -15.658129371, 0), (0, 0, 270))):
            Circle(SKETCH_9_R)
        with Locations(Location((-4.574300699, -15.658129371, 0), (0, 0, 270))):
            Circle(SKETCH_9_R)
        with Locations(Location((7.425699301, -15.658129371, 0), (0, 0, 270))):
            Circle(SKETCH_9_R)
        with Locations(Location((-42.574300699, 6.541870629, 0), (0, 0, 270))):
            Circle(SKETCH_9_R)
        with Locations(Location((-42.574300699, -15.658129371, 0), (0, 0, 270))):
            Circle(SKETCH_9_R)
    extrude(amount=-CUT_EXTRUDE_6_DEPTH, mode=Mode.SUBTRACT)

    # 圆角4
    fillet_4_edges = [part.edges().sort_by_distance(p)[0] for p in [
        (-42.255485289, 0.7, -3.70975892),
        (-42.574300699, 0.7, -9.391870629),
        (-42.574300699, 0.7, 12.808129371),
        (-42.574300699, 0.7, 18.508129371),
    ]]
    fillet(fillet_4_edges, radius=FILLET_4_R)


solid = part.part
